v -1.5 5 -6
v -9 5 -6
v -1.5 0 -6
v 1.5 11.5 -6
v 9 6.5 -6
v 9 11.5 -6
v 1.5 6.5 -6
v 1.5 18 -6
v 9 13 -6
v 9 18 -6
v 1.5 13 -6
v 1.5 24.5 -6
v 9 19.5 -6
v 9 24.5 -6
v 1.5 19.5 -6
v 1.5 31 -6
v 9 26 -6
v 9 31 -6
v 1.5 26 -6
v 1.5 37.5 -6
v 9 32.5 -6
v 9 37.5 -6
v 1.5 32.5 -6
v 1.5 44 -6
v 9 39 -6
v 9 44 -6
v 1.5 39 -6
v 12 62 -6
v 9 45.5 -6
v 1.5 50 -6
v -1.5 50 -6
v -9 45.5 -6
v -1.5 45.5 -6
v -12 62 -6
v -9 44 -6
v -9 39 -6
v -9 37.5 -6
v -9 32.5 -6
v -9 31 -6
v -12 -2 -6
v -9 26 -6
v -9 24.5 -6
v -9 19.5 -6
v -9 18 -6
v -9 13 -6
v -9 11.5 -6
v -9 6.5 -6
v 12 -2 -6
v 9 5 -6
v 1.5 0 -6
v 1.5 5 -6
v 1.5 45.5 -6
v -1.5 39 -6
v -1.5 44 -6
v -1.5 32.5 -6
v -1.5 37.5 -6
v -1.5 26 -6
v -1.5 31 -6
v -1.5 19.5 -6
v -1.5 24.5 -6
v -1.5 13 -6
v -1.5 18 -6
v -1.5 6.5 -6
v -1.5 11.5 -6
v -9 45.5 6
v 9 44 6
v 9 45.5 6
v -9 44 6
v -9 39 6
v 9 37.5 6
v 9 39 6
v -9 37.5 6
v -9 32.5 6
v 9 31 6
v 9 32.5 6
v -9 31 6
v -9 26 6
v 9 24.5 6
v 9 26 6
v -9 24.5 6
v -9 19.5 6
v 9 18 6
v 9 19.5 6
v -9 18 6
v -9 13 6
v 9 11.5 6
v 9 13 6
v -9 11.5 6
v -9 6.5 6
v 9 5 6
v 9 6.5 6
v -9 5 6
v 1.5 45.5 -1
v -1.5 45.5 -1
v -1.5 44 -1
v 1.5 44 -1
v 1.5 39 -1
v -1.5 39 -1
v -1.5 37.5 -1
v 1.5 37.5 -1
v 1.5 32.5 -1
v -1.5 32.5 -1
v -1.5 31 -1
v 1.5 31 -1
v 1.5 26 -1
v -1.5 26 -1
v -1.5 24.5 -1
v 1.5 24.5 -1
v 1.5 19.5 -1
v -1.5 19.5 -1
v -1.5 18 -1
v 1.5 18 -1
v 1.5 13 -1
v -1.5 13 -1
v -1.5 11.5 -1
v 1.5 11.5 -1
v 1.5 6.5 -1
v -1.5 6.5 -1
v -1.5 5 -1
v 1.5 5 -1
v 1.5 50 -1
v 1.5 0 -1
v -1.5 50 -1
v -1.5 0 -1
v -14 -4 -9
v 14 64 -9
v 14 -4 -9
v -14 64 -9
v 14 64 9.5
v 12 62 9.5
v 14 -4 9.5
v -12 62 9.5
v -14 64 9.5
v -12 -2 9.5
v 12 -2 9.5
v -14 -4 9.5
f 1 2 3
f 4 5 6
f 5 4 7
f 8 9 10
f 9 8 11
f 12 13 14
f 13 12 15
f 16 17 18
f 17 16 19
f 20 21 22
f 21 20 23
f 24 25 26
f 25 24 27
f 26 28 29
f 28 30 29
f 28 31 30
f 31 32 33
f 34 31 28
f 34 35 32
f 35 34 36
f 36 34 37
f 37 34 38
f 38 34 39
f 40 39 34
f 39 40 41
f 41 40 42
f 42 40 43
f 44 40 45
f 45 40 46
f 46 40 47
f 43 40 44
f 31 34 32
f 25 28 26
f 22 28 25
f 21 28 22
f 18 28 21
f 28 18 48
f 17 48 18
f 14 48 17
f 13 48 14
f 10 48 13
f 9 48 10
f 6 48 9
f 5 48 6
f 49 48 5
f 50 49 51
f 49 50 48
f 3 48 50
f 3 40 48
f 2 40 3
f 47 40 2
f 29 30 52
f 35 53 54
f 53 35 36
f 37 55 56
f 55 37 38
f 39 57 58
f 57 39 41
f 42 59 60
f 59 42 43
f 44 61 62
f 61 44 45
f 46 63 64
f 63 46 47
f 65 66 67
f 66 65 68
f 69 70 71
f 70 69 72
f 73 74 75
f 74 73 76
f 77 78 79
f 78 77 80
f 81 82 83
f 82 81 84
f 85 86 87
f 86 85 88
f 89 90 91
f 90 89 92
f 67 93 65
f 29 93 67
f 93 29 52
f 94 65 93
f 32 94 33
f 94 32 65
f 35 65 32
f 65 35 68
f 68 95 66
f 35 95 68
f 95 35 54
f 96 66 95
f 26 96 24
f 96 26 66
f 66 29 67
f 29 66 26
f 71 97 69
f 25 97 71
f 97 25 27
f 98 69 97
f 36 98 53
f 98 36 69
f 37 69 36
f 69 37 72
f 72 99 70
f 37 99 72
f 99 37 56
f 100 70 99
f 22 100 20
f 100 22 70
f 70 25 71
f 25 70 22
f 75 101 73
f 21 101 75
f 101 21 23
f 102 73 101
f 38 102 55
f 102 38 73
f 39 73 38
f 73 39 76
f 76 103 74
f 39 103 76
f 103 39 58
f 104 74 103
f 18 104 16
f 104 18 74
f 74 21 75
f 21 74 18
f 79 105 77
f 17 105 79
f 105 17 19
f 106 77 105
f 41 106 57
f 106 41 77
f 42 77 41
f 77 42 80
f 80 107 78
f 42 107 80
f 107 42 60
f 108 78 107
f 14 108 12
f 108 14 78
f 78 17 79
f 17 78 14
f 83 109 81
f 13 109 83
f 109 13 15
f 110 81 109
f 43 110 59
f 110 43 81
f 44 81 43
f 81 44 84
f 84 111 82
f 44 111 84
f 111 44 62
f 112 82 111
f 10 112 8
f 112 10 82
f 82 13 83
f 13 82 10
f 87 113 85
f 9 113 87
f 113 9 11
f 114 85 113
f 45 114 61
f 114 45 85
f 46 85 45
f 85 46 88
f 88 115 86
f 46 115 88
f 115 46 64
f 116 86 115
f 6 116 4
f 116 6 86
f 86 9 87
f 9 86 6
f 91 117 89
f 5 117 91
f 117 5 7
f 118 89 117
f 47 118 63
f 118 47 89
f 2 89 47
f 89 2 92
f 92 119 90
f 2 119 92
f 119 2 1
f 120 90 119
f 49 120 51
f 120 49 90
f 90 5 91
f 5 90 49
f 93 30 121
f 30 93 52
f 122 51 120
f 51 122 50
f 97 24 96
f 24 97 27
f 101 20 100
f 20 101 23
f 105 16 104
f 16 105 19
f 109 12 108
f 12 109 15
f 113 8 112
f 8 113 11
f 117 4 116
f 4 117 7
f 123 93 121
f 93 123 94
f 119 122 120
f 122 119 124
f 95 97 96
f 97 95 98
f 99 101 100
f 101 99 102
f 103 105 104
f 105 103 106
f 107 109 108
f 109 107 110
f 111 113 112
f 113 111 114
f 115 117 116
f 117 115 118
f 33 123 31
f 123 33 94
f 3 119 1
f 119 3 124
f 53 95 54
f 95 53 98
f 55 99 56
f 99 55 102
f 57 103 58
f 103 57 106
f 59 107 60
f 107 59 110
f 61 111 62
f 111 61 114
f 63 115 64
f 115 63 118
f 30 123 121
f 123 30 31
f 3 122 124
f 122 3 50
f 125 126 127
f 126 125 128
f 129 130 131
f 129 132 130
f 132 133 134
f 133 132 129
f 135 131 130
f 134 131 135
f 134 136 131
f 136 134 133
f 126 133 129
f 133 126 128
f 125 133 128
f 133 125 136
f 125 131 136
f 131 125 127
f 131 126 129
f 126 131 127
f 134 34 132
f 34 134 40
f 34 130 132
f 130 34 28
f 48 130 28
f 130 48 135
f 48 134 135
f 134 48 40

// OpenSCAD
/***************************************************************************
* "Parametric Mold Generator for a Soft Robotic PneuNet Bending Actuator" *
*                                                                          *
*   Designed and coded by:                                                 *
*   Jonas Jørgensen (jonasjoergensen.org)                                  *
*   IT University of Copenhagen (itu.dk)                                   *
*                                                                          *
*   Shared under an Attribution-Non Commercial-ShareAlike CC BY-NC-SA      *
*   license (https://creativecommons.org/licenses/by-nc-sa/4.0/).          *
*                                                                          *
***************************************************************************/

$fn=30;

//Change parameters below to alter design and dimensions of the bending actuator:

Air_channel_length = 60; //length including connector piece 
Air_channel_width = 3;
Air_channel_height = 5;//Must be less than or equal to Rib_element_height
Air_connector_length = 10; //Length of the connector piece without ribs and air channel

Rib_element_width = 18;
Rib_element_depth = 1.5;
Rib_element_height = 12;
Rib_element_spacing = 5;

Robot_endwall_thickness=2;
Robot_sidewall_thickness=3;
Robot_topwall_thickness=2.5;

TwistAngle=0; //Angle to rotate the inner ribs (changing this to different form zero will also alter the width of the actuator)
Air_channel_pos_offset = 0;
Mold_bottom_thickness=3;
Mold_wall_thickness=2;


//The values below are calculated from the variables above:
Mold_length = Air_channel_length+Mold_wall_thickness*2+Robot_endwall_thickness*2;
Mold_width=Rib_element_width*cos(TwistAngle)+Mold_wall_thickness*2+Robot_sidewall_thickness*2; 
Mold_wall_height=Rib_element_height+Robot_topwall_thickness+1; //Mold is to be filled with silicone approx. 1mm below the wall height
Number_of_ribs=((Air_channel_length-Air_connector_length)/(Rib_element_depth+Rib_element_spacing))+1;

union() {

    
 //Generate inner parts of the mold: 
    
difference() {

    linear_extrude(height = Rib_element_height, center = true, convexity = 10, slices = 20, scale = 1.0) {
    for (i = [1:Number_of_ribs]){
    translate([0, Rib_element_spacing+(Rib_element_depth/2)+(i-1)*(Rib_element_depth+Rib_element_spacing),0]) rotate(a = TwistAngle, v = [0, 0, 1]) square(size = [Rib_element_width, Rib_element_depth], center = true); //Ribbing elements (The placement of these is used as a basis for calculating the other positions)
    }   
    }
    
    //Cut slanting ribs away at the ends inside the mold:
    translate([-(Mold_width-Mold_wall_thickness*2)/2, -Robot_endwall_thickness-(Rib_element_depth/2),-Mold_wall_height/2]) cube([Mold_width-Mold_wall_thickness*2,Robot_endwall_thickness,Mold_wall_height]); 
    translate([-(Mold_width-Mold_wall_thickness*2)/2, Air_channel_length-(Rib_element_depth/2),-Mold_wall_height/2]) cube([Mold_width-Mold_wall_thickness*2,Robot_endwall_thickness,Mold_wall_height]);

    translate([-(Mold_width-Mold_wall_thickness*2)/2, Air_channel_length-Air_connector_length,-Mold_wall_height/2]) cube([Mold_width-Mold_wall_thickness*2,Air_connector_length,Mold_wall_height]);//cut off ribs at air connector piece
    
    translate([-(Mold_width-Mold_wall_thickness*2)/2, -Mold_wall_thickness-Rib_element_width-Robot_endwall_thickness,-Mold_wall_height/2]) cube([Mold_width-Mold_wall_thickness*2,Rib_element_width,Mold_wall_height]);//In front of mold cut off 
    translate([-(Mold_width-Mold_wall_thickness*2)/2, Rib_element_width+Mold_length-Mold_wall_thickness-Rib_element_width-Robot_endwall_thickness,-Mold_wall_height/2]) cube([Mold_width-Mold_wall_thickness*2,Rib_element_width,Mold_wall_height]);//Behind mold cut off 

    }
     
translate([Air_channel_pos_offset, Air_channel_length/2-Air_connector_length/2,(Air_channel_height/2)-(Rib_element_height/2)]) cube([Air_channel_width, Air_channel_length-Air_connector_length, Air_channel_height], center = true); //Make air channel

//Create outer mold walls:
translate([0, Air_channel_length/2,((Mold_wall_height-Rib_element_height)/2)-Mold_bottom_thickness/2]) linear_extrude(height = (Mold_bottom_thickness+Mold_wall_height), center = true, convexity = 10, slices = 20, scale = 1.0) {
    difference(){
    square(size = [Mold_width, Mold_length], center = true); //Mold (complete volume)
    square(size = [Mold_width-Mold_wall_thickness*2, Mold_length-Mold_wall_thickness*2], center = true); //Mold (inner volume)
    }
    }

 //Generate the bottom of the mold:
 
 translate([0, Air_channel_length/2,(-Rib_element_height/2)-Mold_bottom_thickness/2]) linear_extrude(height = Mold_bottom_thickness, center = true, convexity = 10, slices = 20, scale = 1.0) {
    square(size = [Mold_width, Mold_length], center = true); //Mold (complete volume)
    }
    
}
